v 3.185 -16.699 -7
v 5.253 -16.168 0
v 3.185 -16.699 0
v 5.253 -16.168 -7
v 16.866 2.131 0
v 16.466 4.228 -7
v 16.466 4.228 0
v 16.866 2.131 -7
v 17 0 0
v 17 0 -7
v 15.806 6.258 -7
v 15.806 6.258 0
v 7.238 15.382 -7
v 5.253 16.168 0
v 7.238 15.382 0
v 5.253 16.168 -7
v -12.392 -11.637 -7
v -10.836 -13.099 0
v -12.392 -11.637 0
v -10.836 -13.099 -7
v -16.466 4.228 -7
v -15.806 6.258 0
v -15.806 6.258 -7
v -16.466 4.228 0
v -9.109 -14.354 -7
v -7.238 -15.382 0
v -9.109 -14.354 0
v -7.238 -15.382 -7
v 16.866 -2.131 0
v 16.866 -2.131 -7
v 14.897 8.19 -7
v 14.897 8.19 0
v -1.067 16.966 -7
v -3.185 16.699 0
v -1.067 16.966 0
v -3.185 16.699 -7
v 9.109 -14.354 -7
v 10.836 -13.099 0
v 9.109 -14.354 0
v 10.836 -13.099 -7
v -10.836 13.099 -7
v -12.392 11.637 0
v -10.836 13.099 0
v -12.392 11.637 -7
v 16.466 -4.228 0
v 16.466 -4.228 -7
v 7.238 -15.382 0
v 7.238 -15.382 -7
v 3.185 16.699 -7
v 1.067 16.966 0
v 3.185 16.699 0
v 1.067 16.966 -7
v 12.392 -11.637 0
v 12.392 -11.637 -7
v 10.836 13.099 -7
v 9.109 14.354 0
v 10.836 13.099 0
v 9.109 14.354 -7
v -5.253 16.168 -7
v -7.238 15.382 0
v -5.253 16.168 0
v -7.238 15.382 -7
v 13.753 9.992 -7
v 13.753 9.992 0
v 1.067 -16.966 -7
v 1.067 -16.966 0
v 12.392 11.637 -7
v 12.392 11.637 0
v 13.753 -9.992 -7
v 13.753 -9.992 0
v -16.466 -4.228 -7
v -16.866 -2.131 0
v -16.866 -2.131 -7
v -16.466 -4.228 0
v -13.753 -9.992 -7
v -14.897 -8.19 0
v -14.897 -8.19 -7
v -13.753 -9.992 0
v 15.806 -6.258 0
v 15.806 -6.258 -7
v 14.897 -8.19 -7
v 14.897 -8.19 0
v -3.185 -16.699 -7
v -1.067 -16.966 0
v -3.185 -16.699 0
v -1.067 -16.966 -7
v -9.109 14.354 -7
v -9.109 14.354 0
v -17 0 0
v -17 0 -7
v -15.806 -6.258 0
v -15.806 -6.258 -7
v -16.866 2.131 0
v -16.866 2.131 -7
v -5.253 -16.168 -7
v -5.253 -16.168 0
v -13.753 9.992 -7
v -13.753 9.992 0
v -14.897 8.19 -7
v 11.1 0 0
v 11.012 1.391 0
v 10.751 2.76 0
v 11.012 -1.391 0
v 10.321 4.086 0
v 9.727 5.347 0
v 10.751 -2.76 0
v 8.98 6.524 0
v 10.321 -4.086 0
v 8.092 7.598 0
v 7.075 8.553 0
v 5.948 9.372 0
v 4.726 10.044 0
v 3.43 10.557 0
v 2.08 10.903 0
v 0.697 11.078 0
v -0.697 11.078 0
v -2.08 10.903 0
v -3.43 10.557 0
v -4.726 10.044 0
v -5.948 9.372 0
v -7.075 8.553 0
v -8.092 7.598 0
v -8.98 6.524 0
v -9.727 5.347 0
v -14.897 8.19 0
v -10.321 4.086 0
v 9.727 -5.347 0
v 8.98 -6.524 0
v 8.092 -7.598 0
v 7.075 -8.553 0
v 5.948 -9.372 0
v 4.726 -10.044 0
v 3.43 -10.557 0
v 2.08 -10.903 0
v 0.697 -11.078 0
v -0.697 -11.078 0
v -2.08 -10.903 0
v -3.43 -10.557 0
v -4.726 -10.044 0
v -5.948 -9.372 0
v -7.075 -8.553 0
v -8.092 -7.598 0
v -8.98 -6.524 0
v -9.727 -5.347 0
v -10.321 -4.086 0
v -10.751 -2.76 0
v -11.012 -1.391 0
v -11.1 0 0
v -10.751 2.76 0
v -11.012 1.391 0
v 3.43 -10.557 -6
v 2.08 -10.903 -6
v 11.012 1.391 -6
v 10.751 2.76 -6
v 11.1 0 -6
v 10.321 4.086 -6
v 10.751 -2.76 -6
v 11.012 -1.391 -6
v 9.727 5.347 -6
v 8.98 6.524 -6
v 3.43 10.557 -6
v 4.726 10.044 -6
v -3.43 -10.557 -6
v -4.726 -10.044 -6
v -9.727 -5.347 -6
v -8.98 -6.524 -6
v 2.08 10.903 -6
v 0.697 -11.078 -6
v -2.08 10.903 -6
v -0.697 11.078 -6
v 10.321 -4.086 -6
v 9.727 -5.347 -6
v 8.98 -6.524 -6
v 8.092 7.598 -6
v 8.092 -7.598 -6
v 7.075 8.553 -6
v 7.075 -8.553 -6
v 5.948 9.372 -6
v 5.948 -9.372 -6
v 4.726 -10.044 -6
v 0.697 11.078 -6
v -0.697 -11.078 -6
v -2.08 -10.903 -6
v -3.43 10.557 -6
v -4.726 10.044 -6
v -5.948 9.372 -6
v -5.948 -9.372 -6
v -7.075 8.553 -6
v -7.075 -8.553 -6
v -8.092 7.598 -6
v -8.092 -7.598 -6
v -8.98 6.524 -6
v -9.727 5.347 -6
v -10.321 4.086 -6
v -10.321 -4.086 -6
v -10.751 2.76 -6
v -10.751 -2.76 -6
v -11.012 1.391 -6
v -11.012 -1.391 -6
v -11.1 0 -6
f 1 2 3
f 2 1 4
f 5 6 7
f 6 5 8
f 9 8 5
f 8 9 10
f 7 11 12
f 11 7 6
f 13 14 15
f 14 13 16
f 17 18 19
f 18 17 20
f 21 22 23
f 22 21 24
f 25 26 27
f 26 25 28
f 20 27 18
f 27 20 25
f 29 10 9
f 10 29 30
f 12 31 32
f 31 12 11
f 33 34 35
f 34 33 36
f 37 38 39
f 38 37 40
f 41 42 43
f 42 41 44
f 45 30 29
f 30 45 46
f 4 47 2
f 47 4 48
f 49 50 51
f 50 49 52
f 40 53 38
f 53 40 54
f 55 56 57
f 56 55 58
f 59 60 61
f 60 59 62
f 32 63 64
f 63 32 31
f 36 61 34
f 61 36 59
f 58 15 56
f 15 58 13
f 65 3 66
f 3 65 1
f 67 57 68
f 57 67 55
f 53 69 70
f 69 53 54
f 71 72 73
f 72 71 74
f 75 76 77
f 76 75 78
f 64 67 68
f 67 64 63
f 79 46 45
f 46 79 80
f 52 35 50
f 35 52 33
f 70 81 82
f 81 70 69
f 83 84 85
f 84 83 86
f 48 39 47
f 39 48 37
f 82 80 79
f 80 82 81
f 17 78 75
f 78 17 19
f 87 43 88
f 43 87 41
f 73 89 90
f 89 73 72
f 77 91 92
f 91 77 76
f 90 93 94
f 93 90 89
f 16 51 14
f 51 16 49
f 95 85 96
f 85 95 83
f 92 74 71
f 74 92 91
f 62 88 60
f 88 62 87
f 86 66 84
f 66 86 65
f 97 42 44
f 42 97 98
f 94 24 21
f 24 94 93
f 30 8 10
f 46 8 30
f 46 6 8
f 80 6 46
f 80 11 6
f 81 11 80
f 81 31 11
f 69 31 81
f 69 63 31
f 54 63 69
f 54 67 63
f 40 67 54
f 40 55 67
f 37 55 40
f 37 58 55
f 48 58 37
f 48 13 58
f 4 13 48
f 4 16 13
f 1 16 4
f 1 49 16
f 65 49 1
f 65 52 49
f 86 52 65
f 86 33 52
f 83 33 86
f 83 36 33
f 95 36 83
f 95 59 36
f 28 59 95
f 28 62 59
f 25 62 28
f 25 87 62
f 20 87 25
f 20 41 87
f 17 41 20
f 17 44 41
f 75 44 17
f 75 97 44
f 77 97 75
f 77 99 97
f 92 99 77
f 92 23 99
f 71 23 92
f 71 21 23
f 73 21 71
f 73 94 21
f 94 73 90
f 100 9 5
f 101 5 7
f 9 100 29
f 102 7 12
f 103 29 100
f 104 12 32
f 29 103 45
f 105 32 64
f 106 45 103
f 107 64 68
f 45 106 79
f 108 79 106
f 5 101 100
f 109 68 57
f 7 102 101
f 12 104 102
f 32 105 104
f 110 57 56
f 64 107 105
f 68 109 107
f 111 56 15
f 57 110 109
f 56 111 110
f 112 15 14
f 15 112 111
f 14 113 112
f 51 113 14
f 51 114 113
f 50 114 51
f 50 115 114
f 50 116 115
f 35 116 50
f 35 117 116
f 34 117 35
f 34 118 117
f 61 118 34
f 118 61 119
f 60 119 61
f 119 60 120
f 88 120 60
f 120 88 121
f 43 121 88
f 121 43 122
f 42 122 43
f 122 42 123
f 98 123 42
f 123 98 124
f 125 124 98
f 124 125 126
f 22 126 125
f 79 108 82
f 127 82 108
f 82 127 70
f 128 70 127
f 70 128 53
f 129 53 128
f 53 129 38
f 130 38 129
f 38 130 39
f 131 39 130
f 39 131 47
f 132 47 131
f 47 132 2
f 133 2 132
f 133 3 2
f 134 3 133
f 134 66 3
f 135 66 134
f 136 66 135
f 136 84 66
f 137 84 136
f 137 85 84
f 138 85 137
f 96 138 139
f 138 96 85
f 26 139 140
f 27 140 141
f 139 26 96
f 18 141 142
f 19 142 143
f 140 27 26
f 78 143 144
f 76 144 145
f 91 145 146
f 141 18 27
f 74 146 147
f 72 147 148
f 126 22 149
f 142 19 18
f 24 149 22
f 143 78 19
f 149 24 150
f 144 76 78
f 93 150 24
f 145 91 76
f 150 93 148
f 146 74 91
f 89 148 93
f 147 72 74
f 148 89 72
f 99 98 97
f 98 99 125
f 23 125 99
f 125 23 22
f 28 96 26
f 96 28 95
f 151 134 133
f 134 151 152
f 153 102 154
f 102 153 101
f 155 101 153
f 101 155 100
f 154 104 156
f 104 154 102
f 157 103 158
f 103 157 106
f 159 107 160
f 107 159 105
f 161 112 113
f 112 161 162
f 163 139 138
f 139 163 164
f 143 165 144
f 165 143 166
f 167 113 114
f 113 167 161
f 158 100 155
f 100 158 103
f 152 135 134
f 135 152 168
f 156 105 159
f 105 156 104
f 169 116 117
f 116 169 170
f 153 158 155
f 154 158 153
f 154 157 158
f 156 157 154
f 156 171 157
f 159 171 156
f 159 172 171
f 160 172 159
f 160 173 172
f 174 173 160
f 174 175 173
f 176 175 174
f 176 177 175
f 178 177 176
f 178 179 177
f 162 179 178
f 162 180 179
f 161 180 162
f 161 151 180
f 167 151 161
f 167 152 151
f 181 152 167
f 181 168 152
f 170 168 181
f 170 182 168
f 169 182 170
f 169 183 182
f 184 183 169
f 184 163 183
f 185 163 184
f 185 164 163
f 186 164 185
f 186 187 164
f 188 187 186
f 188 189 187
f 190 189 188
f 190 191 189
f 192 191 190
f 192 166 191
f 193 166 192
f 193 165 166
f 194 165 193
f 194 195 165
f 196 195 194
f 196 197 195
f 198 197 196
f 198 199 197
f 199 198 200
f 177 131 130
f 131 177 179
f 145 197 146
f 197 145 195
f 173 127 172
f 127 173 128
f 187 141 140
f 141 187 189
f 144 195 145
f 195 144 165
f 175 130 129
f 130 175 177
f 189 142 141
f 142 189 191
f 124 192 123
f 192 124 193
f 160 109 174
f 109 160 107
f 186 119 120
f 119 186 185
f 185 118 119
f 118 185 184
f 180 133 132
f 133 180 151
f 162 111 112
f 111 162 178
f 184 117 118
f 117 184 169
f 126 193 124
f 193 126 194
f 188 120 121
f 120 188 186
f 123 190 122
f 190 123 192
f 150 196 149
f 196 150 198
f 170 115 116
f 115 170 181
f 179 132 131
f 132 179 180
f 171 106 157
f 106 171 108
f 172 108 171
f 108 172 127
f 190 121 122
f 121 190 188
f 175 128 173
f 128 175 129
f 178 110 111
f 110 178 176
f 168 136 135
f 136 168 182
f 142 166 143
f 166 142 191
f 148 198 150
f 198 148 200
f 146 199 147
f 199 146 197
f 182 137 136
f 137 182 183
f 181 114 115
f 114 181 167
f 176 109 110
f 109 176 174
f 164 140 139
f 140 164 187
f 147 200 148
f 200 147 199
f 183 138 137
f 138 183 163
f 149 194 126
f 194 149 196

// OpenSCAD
$fn = 50;


difference() {
	union() {
		translate(v = [0, 0, -7.0000000000]) {
			cylinder(h = 7, r = 17.0000000000);
		}
	}
	union() {
		#translate(v = [0, 0, -6.0000000000]) {
			cylinder(h = 6, r = 11.1000000000);
		}
	}
}
